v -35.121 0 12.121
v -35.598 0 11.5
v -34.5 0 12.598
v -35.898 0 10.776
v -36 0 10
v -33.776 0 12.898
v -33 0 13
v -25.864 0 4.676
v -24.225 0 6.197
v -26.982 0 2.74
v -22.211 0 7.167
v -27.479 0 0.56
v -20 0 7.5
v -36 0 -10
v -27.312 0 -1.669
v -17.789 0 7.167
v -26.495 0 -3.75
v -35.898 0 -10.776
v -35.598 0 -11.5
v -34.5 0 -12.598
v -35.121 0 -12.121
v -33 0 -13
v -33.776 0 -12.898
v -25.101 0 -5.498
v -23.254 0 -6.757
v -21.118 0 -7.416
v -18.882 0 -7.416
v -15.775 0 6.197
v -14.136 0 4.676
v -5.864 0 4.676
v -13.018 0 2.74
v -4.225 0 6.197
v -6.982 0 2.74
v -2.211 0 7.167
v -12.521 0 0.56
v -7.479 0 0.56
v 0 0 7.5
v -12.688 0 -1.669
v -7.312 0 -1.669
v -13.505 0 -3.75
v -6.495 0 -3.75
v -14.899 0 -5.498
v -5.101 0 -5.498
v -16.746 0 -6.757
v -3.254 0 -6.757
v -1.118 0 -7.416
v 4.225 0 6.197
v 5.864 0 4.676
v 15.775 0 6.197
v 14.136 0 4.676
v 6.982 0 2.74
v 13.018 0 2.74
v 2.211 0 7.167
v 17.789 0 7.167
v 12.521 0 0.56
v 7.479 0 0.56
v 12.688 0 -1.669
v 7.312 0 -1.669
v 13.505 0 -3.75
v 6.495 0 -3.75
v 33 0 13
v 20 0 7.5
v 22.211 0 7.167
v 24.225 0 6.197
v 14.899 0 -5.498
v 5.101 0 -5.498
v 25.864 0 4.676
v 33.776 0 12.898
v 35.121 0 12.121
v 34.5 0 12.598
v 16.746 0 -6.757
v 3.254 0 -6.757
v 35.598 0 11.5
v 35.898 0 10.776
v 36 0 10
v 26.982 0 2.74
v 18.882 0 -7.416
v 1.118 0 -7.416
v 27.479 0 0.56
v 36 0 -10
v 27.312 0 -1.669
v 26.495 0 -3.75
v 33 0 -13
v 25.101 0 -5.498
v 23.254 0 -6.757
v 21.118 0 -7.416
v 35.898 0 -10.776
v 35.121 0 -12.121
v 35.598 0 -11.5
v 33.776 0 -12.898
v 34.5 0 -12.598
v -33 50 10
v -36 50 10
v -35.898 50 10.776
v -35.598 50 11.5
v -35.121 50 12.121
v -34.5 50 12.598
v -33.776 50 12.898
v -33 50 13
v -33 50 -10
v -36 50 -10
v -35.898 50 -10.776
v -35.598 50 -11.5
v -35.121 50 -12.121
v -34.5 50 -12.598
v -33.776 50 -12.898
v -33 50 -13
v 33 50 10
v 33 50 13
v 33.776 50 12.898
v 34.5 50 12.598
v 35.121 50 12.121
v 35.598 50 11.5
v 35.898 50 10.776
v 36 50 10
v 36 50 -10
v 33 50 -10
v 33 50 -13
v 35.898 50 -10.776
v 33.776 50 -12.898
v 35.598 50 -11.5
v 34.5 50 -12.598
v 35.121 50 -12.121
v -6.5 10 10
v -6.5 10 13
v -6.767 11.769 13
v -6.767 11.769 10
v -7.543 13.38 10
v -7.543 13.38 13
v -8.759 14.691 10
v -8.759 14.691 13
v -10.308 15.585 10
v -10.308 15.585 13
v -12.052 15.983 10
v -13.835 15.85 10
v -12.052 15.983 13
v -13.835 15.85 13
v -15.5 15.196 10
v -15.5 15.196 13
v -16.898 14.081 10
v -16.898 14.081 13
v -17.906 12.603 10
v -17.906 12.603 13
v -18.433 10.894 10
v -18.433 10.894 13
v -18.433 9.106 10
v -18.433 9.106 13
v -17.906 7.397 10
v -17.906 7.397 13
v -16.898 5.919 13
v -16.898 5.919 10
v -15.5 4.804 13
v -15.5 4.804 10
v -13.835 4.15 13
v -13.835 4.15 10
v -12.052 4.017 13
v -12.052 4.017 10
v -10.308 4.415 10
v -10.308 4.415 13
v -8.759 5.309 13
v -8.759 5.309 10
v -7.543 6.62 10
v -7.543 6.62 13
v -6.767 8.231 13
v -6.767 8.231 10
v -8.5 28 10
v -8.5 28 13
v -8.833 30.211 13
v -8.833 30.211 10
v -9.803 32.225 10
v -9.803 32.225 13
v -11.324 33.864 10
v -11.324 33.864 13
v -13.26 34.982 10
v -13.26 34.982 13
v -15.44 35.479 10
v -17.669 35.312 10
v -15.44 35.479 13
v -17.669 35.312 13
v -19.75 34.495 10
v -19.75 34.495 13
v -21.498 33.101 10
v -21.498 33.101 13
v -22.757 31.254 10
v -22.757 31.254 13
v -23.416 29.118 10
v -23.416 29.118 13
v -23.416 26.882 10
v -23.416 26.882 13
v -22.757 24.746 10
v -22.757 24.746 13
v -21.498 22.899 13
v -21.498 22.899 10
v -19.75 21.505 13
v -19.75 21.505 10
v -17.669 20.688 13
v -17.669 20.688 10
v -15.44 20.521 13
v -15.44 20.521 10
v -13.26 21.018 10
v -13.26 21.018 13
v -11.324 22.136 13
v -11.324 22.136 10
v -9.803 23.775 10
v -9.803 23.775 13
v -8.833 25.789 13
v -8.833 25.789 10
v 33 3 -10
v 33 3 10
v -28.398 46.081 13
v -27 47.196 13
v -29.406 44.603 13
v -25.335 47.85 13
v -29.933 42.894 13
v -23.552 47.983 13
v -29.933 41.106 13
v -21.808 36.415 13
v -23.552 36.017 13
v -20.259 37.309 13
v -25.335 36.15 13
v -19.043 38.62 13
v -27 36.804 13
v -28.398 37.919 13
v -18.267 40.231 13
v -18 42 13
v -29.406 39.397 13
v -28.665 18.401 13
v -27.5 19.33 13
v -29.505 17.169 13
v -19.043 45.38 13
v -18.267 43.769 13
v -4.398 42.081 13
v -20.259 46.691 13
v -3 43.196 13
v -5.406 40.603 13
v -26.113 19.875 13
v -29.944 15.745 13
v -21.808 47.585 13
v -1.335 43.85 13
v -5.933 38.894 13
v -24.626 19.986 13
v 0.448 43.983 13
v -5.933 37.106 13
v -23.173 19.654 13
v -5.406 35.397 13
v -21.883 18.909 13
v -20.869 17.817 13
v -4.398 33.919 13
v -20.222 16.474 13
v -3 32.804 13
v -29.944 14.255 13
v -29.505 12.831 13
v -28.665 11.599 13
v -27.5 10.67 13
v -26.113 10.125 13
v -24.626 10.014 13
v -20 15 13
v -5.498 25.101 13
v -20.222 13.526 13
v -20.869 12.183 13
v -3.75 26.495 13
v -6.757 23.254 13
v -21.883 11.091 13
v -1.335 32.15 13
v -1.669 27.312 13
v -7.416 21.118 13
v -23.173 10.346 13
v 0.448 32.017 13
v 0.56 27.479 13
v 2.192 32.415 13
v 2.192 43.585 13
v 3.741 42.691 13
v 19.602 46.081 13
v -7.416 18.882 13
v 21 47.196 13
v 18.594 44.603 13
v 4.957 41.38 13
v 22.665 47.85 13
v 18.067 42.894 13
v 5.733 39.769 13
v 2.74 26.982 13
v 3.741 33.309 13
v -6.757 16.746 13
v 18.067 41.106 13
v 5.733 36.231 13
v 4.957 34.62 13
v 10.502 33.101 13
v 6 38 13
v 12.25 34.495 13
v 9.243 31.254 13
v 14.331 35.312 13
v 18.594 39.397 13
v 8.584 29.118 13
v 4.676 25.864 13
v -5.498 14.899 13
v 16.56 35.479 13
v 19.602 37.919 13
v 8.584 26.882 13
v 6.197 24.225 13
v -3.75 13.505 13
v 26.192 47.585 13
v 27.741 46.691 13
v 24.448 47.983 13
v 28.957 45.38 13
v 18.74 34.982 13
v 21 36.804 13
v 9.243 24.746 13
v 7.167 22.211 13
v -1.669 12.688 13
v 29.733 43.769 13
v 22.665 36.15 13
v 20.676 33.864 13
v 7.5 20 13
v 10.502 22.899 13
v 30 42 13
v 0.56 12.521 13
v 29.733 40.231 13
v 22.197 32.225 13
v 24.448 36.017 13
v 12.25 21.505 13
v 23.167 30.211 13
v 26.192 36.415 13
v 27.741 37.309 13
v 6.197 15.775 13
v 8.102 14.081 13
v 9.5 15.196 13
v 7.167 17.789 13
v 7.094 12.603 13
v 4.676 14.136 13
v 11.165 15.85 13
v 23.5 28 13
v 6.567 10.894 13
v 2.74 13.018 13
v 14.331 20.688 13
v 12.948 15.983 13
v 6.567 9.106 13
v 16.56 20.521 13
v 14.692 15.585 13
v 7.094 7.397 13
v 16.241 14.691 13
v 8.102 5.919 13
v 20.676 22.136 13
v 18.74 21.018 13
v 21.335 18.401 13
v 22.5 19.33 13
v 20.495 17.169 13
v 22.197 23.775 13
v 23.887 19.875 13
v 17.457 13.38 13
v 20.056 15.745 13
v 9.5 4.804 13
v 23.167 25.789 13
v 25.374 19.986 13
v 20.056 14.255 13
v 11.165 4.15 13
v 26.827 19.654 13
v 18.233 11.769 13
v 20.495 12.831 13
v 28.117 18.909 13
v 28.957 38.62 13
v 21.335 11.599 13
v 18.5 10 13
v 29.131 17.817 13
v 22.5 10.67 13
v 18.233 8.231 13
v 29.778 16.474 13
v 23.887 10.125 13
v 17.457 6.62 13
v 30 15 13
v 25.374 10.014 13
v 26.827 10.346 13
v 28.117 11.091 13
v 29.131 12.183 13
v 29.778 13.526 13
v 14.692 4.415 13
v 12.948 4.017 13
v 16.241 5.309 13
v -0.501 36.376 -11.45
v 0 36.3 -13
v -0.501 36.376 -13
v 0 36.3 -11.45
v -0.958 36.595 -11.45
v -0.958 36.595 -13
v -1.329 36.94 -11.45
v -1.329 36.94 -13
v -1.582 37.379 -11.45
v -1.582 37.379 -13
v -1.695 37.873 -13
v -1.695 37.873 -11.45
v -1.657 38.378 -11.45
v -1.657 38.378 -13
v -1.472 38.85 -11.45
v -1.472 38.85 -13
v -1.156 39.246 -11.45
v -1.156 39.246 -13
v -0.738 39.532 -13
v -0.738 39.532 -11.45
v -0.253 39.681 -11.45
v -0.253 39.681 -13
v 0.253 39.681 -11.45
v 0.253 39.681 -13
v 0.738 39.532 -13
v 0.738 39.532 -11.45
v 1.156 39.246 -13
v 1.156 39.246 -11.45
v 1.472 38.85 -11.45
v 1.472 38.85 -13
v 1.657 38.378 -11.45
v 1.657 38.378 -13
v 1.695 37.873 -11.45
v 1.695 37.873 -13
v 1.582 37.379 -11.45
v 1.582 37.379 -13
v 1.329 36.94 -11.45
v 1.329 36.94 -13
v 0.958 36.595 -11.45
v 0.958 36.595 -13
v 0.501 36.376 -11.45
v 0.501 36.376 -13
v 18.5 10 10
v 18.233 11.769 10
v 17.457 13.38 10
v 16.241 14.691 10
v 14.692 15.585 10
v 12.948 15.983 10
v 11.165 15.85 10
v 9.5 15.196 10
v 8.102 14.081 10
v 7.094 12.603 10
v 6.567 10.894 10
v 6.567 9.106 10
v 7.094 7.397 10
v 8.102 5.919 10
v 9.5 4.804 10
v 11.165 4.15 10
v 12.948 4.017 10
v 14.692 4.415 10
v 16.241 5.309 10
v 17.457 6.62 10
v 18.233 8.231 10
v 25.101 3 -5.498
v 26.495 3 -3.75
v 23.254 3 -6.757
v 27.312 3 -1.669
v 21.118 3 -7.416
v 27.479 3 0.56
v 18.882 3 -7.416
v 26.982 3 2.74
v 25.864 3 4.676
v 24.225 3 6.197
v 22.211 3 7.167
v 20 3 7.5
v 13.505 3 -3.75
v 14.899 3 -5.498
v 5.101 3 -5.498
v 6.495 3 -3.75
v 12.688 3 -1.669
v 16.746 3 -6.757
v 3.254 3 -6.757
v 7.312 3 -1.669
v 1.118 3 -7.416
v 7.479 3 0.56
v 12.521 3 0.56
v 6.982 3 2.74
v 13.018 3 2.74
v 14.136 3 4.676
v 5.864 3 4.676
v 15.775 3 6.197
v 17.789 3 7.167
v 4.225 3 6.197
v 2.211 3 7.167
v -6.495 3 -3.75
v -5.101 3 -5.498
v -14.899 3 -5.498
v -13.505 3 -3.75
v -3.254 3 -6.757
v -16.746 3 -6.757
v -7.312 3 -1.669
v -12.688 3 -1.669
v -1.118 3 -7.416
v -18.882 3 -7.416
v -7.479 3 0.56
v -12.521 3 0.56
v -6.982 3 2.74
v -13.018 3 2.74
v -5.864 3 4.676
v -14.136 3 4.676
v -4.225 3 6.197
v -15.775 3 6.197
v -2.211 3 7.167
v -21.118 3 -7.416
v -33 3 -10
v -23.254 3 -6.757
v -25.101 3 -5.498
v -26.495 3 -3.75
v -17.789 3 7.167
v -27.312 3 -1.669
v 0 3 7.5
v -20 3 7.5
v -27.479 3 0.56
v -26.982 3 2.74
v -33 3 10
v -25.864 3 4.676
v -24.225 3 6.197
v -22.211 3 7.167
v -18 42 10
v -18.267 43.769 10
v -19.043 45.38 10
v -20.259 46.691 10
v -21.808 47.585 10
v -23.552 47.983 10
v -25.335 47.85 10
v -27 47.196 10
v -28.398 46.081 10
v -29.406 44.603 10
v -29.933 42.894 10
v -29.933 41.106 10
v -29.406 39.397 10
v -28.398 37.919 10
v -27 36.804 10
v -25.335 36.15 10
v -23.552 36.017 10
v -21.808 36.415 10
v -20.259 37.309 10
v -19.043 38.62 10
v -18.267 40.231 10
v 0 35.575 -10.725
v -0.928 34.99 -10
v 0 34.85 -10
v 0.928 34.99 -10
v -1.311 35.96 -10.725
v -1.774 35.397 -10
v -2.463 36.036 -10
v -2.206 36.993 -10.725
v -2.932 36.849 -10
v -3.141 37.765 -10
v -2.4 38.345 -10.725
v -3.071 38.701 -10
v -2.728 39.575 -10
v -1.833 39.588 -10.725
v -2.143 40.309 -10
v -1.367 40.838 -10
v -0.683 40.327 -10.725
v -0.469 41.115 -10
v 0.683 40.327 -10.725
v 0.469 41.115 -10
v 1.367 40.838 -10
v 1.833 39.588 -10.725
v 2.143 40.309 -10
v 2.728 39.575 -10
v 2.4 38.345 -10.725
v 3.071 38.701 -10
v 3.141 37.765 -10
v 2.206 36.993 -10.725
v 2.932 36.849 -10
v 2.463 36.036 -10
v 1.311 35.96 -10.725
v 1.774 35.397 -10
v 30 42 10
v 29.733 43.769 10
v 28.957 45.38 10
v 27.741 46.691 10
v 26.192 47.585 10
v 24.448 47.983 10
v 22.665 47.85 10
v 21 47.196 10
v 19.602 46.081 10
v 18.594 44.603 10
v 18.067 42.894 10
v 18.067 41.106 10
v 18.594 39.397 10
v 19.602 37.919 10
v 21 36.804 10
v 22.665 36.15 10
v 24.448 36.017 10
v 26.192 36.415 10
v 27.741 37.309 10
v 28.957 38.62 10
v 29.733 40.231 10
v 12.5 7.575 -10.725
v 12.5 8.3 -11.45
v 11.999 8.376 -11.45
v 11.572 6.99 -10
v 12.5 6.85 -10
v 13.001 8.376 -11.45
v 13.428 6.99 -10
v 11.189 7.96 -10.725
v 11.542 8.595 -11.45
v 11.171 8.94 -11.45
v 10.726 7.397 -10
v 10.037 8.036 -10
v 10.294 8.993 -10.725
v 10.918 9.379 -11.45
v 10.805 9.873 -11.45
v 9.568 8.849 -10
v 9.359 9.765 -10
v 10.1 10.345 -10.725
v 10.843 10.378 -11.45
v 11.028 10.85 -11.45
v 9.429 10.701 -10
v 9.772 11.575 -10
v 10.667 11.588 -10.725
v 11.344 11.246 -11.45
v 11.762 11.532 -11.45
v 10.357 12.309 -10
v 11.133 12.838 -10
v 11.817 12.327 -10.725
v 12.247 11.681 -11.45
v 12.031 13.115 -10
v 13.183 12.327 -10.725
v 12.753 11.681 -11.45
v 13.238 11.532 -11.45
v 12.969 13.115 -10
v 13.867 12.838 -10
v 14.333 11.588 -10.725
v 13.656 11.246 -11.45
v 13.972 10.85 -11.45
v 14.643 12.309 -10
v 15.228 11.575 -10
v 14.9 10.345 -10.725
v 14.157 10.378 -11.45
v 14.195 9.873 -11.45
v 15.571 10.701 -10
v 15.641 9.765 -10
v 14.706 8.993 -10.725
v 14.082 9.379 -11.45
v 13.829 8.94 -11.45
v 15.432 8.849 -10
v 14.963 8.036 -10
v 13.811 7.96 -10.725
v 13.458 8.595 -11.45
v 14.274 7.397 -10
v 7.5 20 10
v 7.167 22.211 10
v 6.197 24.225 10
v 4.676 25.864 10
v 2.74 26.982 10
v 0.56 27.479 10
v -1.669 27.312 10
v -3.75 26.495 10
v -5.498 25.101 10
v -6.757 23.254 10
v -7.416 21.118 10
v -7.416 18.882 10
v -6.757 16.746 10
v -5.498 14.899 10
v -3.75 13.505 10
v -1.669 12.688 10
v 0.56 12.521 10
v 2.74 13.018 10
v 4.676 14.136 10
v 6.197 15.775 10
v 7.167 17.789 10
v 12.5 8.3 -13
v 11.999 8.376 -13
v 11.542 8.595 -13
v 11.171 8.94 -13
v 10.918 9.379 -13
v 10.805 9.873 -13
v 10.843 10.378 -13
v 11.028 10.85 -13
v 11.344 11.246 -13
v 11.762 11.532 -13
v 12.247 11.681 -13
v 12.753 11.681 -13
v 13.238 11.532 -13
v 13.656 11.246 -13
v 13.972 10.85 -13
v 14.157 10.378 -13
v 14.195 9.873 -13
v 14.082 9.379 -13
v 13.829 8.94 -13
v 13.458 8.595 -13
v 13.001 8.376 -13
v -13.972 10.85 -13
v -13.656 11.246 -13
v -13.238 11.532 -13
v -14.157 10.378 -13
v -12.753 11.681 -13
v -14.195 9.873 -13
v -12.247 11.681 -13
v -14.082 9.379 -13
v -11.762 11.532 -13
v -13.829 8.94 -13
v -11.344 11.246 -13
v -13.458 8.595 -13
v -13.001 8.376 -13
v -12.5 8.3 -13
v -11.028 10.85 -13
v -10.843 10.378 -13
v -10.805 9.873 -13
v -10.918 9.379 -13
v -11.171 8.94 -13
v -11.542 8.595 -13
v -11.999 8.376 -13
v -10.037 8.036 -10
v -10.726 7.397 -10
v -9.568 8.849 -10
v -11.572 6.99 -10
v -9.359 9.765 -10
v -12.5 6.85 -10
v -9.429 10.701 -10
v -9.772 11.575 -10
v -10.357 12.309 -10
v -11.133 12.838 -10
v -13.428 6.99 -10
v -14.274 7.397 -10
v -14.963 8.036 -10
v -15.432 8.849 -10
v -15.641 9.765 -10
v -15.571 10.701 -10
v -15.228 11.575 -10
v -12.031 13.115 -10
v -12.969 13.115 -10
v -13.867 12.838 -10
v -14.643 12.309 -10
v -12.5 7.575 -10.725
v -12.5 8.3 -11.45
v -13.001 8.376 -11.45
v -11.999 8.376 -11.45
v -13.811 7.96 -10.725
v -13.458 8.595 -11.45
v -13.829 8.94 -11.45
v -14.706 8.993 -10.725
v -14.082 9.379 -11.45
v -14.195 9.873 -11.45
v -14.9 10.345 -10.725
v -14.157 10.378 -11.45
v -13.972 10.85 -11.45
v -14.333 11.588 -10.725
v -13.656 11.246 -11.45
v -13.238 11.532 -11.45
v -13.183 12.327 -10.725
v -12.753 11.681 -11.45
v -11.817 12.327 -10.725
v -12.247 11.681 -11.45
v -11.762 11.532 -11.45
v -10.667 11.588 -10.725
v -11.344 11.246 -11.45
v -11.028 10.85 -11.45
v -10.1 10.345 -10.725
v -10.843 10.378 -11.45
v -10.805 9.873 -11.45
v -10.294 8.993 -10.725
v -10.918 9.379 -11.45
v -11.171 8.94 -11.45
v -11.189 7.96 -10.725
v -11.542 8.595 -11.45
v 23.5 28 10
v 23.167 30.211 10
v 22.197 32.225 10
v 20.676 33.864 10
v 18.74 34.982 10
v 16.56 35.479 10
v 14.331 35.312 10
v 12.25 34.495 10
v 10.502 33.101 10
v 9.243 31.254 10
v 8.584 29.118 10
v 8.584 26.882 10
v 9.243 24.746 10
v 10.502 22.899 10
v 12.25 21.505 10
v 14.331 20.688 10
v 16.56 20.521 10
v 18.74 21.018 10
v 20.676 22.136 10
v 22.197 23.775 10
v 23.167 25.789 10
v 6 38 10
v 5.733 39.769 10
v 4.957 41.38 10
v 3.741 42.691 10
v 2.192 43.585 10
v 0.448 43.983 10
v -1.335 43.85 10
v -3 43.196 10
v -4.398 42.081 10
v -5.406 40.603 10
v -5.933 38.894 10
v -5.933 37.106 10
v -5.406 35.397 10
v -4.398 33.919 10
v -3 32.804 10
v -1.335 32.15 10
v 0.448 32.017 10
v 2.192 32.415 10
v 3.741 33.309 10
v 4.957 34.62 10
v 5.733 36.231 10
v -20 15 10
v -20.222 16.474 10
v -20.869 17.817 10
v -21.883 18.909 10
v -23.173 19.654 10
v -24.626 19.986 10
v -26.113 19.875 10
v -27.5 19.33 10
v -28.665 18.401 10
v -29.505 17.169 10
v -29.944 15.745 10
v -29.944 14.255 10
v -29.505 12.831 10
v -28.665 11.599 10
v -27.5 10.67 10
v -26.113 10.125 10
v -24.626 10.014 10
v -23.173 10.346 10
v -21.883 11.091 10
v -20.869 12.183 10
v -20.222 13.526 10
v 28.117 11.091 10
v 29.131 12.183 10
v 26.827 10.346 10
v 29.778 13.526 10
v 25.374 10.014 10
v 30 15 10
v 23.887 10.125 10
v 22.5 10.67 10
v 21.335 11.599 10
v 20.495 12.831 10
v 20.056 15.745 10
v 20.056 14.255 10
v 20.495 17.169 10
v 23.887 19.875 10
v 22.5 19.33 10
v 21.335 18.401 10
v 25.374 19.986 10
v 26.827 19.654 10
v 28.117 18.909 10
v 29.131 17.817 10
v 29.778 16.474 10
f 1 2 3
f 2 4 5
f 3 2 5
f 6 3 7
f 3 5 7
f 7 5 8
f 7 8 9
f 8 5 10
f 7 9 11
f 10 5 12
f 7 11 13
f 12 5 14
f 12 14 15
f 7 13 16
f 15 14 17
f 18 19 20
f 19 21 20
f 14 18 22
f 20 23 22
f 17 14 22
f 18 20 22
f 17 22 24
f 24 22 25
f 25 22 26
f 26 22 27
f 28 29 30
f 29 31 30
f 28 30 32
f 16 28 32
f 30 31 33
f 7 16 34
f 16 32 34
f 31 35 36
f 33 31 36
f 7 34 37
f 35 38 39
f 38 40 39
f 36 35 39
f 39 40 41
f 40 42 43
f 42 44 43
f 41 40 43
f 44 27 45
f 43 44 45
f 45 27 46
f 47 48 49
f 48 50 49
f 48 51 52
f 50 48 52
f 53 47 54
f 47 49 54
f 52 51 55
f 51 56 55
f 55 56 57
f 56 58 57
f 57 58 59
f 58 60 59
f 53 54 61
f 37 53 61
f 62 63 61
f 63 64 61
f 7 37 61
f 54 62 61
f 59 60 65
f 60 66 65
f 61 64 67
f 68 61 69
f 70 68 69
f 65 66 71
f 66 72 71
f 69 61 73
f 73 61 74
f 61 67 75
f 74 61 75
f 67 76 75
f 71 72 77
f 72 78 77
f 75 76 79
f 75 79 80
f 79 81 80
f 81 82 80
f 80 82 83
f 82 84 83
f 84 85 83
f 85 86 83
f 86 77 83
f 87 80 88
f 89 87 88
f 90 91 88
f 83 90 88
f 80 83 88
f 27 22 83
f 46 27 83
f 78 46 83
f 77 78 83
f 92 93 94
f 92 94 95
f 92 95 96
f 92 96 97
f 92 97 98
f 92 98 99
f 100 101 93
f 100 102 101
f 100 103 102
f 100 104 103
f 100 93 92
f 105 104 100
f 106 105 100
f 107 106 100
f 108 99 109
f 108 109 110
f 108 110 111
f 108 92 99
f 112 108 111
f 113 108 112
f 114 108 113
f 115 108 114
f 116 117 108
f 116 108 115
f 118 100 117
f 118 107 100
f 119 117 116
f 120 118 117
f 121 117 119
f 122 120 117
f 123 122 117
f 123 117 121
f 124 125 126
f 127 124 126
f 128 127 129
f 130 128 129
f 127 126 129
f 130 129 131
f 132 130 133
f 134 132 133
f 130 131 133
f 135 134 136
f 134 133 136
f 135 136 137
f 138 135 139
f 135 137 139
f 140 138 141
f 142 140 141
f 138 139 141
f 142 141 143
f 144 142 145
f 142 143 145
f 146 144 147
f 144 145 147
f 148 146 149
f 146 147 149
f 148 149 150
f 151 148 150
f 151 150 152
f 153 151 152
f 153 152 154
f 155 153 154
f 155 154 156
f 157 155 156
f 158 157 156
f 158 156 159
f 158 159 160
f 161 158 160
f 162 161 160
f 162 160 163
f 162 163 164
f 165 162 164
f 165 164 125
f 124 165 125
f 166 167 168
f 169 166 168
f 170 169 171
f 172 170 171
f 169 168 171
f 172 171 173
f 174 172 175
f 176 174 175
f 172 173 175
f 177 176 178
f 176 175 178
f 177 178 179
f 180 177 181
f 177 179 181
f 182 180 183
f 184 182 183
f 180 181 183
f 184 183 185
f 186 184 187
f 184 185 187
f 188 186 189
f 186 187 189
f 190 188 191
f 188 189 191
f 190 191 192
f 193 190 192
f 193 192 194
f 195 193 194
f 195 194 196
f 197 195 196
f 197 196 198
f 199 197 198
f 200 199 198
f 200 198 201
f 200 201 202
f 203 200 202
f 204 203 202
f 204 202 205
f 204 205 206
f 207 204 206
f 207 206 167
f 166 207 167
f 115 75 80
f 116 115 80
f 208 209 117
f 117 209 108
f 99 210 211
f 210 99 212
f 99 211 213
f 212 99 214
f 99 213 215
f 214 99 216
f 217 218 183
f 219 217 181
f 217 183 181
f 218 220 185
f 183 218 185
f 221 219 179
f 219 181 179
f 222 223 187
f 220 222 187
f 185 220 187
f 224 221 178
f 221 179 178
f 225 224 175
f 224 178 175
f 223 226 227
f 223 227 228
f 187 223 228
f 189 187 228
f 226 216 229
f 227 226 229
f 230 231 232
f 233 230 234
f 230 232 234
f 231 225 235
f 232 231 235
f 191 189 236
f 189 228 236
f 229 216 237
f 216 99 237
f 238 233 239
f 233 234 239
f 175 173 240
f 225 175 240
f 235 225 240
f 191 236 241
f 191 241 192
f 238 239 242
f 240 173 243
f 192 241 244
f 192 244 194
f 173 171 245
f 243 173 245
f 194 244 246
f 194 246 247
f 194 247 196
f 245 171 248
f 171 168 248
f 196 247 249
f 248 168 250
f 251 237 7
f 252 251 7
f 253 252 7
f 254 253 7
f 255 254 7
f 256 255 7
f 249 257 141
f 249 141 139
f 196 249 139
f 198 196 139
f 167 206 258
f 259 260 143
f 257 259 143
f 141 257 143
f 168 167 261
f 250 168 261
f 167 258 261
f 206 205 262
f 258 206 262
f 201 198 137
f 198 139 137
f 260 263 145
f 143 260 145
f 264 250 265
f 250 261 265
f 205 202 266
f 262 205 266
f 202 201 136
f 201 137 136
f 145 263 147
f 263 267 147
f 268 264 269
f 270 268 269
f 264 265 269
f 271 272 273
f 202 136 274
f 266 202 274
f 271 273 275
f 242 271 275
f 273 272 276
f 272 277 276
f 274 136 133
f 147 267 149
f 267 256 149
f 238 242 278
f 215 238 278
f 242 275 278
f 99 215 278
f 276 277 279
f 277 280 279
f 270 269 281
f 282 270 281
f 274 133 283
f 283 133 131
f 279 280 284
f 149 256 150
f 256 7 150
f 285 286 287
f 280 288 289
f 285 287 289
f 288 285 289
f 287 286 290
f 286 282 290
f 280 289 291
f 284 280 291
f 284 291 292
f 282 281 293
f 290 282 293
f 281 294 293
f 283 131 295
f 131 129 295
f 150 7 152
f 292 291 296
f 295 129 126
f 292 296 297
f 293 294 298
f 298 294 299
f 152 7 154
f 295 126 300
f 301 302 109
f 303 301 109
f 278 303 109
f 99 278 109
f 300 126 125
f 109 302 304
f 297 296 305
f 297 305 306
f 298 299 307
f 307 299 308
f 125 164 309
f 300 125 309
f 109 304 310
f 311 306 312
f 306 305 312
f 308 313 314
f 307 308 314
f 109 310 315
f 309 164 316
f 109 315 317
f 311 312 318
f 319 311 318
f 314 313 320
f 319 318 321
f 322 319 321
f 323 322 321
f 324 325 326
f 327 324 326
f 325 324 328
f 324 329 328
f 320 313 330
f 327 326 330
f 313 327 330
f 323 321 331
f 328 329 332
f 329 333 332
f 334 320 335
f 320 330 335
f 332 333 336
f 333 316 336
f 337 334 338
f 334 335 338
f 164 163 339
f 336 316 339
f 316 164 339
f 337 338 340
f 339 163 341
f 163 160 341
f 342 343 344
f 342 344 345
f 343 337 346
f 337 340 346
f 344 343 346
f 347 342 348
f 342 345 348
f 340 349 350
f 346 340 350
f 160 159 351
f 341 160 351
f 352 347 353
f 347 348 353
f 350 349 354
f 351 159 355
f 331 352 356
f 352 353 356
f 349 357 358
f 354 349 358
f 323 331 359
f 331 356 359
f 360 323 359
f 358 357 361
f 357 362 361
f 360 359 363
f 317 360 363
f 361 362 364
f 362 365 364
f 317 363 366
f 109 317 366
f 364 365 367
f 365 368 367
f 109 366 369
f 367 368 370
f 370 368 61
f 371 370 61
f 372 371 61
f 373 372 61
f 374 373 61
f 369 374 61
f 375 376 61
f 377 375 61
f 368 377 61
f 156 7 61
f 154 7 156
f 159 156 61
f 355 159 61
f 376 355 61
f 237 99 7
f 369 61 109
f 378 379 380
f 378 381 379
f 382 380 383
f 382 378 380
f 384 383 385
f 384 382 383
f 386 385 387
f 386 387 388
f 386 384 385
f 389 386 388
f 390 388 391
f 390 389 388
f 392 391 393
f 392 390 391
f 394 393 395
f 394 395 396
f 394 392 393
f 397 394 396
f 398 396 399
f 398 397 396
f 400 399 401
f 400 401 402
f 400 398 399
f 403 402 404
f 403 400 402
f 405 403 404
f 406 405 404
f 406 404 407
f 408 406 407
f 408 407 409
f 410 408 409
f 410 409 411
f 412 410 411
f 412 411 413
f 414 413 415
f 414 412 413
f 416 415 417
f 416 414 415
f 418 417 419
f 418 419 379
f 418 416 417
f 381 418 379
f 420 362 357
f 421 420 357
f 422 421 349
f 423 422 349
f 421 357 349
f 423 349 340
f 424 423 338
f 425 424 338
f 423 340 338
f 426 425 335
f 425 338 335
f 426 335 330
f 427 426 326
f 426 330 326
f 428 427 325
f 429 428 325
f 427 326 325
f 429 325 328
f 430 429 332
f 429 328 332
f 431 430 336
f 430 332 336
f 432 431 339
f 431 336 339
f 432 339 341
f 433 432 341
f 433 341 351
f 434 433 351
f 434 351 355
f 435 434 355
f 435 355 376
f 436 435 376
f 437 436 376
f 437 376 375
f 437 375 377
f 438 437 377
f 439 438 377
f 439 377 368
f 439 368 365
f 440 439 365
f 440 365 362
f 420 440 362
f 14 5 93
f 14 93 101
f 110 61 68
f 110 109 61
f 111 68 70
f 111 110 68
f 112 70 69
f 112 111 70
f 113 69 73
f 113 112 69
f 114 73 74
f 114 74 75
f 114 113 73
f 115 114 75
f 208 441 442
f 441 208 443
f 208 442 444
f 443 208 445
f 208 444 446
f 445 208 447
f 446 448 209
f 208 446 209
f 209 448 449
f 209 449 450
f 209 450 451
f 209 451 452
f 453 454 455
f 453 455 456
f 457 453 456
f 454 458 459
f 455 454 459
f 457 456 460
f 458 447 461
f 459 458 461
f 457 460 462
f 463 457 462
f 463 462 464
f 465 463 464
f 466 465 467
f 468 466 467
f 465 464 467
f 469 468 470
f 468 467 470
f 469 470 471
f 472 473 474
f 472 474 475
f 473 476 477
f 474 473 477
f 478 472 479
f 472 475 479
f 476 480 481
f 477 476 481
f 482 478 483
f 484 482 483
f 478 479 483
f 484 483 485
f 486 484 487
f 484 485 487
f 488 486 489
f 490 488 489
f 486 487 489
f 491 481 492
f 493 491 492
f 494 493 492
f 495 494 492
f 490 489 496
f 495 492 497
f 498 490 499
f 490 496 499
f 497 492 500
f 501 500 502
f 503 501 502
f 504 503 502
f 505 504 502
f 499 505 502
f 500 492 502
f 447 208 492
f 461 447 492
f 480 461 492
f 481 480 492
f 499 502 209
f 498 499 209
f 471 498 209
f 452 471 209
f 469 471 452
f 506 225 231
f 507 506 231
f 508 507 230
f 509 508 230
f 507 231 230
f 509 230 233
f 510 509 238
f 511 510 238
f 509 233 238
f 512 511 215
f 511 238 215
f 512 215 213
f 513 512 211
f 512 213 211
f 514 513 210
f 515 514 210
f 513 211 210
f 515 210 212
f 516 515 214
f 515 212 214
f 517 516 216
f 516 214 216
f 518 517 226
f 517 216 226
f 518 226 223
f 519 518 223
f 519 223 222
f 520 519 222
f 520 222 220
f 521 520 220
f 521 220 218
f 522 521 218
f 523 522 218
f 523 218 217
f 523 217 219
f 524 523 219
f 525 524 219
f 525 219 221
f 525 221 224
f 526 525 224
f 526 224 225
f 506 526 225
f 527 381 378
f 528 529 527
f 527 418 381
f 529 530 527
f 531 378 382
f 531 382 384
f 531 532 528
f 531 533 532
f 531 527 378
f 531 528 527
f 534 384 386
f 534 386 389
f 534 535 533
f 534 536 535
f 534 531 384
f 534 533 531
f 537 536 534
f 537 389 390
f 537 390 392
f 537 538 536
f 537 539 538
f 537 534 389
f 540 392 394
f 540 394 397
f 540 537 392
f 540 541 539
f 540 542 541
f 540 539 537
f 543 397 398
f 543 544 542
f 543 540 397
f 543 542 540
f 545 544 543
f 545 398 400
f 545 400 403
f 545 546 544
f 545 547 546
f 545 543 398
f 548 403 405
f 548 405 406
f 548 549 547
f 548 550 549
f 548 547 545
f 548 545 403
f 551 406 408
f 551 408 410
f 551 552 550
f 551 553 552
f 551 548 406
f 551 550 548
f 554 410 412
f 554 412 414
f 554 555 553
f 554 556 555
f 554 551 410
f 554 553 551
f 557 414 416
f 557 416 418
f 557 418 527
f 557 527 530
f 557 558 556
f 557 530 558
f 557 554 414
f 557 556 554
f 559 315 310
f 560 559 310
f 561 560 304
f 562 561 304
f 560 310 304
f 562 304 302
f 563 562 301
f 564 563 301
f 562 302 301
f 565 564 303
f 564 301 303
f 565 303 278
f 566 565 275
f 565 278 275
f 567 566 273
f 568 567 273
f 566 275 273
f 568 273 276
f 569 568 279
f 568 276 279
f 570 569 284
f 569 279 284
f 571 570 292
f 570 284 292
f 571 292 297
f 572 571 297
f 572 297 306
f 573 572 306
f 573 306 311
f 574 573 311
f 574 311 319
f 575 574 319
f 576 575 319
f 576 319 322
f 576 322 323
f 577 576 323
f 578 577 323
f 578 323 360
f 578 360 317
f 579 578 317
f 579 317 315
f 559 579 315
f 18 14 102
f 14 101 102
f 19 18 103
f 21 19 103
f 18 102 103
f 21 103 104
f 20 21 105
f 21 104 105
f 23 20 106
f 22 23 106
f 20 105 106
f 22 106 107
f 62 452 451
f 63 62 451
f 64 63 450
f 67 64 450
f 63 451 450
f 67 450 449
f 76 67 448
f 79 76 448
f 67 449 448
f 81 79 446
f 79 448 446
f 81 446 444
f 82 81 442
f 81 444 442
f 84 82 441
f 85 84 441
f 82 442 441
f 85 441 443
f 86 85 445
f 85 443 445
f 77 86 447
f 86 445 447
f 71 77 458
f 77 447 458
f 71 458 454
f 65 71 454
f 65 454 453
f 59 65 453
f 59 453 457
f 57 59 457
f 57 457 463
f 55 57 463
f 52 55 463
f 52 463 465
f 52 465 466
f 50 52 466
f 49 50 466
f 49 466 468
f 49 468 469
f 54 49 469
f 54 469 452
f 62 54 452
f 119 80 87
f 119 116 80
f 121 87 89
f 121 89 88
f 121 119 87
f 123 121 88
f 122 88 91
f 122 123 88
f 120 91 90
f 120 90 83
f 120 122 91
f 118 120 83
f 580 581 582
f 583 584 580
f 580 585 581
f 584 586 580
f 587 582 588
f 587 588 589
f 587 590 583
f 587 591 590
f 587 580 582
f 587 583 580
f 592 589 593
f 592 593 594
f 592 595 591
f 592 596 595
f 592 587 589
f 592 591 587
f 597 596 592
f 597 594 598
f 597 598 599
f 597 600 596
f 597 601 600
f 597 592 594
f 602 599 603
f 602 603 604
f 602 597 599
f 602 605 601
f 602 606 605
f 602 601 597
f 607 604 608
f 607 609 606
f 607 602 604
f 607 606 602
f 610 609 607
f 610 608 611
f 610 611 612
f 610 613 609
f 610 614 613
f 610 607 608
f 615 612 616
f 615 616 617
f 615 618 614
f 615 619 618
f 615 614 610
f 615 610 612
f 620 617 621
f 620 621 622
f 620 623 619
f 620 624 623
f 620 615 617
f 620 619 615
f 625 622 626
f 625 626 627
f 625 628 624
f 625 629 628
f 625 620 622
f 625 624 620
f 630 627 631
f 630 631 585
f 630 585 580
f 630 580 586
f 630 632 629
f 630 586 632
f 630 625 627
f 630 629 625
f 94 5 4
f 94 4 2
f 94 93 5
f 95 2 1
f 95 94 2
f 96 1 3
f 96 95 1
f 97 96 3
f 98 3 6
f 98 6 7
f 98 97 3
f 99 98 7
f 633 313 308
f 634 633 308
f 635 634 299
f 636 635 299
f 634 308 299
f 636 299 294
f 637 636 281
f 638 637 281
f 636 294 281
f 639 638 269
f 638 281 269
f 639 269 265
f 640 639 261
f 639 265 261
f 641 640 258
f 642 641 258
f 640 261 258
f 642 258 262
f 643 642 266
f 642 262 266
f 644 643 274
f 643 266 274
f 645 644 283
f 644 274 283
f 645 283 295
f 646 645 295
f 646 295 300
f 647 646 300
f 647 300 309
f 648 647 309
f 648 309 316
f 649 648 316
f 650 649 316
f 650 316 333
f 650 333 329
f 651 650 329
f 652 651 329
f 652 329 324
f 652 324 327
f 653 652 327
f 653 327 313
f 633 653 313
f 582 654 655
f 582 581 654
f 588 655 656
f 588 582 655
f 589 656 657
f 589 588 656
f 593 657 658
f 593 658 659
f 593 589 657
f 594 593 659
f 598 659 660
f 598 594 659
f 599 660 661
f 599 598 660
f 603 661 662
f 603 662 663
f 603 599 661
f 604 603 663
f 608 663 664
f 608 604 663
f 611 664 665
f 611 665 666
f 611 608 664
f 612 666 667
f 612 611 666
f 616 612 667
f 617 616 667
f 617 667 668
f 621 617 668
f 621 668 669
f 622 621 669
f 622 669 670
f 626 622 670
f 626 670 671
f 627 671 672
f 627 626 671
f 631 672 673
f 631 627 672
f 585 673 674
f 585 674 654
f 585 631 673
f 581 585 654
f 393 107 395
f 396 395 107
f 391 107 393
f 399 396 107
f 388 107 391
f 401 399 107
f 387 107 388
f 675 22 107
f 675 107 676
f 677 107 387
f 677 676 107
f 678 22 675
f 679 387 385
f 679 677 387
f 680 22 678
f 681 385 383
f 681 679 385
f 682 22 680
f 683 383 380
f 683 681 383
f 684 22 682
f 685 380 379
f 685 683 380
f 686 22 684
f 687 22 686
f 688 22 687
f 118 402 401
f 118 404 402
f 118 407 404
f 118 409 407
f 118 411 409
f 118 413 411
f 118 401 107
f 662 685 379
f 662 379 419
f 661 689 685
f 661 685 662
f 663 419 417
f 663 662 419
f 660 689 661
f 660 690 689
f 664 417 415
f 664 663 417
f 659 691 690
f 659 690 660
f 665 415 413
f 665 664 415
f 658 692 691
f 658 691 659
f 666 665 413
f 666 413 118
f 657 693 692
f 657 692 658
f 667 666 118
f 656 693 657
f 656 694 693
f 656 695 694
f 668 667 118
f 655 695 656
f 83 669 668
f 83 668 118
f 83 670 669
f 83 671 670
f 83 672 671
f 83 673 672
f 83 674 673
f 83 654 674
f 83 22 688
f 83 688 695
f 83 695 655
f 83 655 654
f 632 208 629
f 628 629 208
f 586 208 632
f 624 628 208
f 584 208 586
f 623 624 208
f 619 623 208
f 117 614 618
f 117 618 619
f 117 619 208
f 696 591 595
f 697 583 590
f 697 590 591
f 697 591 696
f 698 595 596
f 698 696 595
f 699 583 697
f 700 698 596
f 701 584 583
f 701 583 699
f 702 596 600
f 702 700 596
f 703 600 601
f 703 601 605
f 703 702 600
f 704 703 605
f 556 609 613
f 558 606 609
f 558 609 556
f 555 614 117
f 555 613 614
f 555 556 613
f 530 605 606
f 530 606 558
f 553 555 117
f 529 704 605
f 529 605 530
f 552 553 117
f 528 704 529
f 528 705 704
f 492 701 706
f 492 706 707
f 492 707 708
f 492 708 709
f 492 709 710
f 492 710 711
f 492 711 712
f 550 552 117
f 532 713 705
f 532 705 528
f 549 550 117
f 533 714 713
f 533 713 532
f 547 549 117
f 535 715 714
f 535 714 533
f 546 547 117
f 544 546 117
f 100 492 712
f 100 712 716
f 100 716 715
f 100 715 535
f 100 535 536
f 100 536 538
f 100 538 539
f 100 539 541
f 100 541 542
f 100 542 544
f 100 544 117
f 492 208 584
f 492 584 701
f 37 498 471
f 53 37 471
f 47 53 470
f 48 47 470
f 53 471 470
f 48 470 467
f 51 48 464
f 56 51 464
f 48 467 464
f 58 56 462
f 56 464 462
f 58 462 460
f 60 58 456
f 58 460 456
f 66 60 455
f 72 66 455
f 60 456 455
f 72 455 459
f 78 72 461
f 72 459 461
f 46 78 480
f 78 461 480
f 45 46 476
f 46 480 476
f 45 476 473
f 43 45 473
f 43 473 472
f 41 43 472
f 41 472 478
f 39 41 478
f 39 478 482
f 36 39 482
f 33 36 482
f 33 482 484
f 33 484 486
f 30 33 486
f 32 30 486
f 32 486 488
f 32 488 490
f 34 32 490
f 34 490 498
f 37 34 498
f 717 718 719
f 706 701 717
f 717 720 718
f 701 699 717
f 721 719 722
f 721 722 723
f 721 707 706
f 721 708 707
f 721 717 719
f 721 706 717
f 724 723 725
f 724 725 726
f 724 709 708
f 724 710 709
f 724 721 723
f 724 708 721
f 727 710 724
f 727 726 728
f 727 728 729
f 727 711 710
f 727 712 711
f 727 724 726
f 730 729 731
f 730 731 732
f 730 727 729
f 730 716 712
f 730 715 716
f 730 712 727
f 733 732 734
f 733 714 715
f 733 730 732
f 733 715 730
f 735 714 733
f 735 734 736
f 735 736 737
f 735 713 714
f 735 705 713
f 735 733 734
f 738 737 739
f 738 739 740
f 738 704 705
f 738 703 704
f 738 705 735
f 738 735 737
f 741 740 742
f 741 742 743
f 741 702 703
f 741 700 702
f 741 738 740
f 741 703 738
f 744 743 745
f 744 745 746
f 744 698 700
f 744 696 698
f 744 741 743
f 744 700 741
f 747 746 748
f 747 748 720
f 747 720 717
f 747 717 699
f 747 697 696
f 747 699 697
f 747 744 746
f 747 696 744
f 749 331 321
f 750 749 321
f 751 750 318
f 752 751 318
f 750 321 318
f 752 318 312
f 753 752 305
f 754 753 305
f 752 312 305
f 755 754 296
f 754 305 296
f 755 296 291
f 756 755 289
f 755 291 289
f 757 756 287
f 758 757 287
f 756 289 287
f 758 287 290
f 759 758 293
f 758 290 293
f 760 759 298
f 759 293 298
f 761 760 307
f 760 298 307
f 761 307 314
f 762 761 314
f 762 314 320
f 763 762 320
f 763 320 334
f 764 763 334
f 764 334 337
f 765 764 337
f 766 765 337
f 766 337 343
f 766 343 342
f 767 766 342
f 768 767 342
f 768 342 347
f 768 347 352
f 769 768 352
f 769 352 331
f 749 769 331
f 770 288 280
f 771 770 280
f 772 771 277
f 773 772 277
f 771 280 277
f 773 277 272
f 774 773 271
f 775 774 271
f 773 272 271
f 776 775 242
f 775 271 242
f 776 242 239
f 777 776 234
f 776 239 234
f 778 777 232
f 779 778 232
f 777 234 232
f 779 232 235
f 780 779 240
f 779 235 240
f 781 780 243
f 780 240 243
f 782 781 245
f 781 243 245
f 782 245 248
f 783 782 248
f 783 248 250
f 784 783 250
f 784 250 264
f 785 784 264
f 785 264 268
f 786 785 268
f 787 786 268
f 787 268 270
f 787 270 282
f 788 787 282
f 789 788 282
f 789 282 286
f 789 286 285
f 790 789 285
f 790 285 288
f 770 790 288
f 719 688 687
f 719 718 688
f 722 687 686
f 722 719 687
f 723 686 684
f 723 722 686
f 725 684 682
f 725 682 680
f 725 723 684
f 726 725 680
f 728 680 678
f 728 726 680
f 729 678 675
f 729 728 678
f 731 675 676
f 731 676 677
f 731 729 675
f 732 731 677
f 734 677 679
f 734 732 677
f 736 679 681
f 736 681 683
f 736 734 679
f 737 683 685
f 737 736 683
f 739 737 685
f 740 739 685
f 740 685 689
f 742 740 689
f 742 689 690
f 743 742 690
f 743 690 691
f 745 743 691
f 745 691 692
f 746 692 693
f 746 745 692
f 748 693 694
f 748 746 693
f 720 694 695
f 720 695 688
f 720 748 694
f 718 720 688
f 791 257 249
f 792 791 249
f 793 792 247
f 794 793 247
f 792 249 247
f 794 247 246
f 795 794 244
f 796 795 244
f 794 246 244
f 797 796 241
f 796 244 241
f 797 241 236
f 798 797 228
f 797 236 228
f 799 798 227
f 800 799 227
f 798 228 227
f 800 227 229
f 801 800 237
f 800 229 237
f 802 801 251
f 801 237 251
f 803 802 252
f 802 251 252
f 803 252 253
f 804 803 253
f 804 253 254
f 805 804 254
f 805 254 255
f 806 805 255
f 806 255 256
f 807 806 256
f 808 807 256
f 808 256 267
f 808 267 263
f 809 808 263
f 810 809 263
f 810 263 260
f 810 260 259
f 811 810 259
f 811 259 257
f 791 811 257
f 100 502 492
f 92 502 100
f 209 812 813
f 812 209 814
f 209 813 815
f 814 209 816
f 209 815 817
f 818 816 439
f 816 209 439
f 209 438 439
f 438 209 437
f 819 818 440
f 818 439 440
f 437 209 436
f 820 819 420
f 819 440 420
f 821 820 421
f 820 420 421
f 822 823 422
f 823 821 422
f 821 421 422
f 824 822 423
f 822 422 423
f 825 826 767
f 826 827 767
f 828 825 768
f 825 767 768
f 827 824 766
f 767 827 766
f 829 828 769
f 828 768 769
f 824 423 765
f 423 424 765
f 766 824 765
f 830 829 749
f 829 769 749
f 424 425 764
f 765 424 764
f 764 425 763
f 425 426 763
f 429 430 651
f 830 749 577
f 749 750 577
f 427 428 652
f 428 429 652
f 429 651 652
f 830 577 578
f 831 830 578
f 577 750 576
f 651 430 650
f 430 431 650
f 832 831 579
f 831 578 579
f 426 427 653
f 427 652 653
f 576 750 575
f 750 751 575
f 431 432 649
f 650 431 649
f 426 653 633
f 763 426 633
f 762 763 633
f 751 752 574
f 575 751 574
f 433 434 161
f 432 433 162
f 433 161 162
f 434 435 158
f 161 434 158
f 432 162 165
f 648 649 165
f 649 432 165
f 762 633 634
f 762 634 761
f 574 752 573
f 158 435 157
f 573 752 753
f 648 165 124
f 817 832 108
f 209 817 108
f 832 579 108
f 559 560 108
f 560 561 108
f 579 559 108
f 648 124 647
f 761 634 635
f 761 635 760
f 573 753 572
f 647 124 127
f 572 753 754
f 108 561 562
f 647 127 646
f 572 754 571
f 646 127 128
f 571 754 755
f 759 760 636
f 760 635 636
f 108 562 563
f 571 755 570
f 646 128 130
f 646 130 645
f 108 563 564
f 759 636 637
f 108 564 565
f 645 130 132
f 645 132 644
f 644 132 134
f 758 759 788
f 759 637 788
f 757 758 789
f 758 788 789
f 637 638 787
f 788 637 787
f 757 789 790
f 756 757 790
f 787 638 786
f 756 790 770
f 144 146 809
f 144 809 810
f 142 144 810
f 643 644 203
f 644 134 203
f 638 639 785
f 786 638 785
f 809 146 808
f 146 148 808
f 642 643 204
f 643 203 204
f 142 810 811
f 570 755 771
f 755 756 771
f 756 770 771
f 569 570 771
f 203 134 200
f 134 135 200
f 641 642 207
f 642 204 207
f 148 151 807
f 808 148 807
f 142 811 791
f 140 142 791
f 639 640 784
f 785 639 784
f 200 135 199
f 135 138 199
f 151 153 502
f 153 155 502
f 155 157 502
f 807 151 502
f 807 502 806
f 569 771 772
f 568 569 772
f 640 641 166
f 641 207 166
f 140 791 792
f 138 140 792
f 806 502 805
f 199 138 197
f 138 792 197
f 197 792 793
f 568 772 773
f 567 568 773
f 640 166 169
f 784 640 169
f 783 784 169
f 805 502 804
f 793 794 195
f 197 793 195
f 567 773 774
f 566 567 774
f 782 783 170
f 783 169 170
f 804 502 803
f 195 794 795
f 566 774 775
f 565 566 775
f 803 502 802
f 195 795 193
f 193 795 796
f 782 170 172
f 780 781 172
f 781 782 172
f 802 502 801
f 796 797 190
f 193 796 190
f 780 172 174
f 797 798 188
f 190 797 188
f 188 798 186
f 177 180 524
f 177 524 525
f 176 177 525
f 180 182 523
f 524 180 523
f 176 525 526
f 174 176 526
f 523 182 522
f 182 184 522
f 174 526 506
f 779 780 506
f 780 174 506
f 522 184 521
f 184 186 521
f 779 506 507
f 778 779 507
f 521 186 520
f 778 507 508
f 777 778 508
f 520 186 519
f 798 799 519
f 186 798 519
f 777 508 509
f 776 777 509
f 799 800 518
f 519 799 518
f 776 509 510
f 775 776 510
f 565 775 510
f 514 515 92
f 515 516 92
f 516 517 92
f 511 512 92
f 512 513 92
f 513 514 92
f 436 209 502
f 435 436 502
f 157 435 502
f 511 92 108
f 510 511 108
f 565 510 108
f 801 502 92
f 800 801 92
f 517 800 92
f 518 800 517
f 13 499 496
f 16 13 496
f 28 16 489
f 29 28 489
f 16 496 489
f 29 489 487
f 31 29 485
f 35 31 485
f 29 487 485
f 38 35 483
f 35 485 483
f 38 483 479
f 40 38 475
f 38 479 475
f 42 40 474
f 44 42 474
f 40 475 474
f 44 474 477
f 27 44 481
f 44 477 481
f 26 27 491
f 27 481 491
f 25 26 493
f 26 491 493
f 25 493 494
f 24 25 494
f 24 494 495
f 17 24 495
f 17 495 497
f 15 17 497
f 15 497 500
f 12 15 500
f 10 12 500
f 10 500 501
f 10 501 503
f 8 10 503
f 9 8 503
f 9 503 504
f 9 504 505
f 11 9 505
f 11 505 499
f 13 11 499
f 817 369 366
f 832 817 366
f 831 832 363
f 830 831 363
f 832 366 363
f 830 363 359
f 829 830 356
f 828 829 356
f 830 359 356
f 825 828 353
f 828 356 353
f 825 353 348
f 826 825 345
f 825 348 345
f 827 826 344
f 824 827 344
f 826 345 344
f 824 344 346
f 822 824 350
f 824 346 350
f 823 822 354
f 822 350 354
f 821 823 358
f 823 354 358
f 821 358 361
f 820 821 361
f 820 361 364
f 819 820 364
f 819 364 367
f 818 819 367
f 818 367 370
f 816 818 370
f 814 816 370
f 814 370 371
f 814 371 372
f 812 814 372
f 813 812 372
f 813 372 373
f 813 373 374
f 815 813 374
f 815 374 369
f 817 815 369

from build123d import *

# Parameters (mm, degrees)
SKETCH1_W                                    = 72
SKETCH1_H                                    = 26
BOSS_EXTRUDE1_DEPTH                          = 50
FILLET1_R                                    = 3
SHELL1_START                                 = -33
SHELL1_OUTLINE_W                             = 47
SHELL1_OUTLINE_H                             = 20
SHELL1_DEPTH                                 = 66
SKETCH2_R                                    = 7.5
CUT_EXTRUDE1_DEPTH                           = 61.613529843
CSK_FOR_M3_COUNTERSUNK_FLAT_HEAD_SCR_2_COUNT = 2
CSK_FOR_M3_COUNTERSUNK_FLAT_HEAD_SCR_2_PITCH = 30.663496213
CSK_FOR_M3_COUNTERSUNK_FLAT_HEAD_SCR_3_COUNT = 2
CSK_FOR_M3_COUNTERSUNK_FLAT_HEAD_SCR_3_PITCH = 30.663496213
CUT_EXTRUDE2_REACH                           = 68.873
SKETCH6_R                                    = 6
SKETCH6_R_2                                  = 7.5
SKETCH6_R_3                                  = 5


# Read off the part's stored shape, not the designer's step: Shell1
with BuildPart() as part:
    # Sketch1 → Boss-Extrude1 (new body)
    with BuildSketch(Plane(origin=(0, 0, 0), x_dir=(1, 0, 0), z_dir=(0, 1, 0))):
        Rectangle(SKETCH1_W, SKETCH1_H)
    extrude(amount=BOSS_EXTRUDE1_DEPTH)

    # Fillet1
    fillet1_edges = [part.edges().sort_by_distance(p)[0] for p in [
        (-36, 25, -13),
        (36, 25, -13),
        (36, 25, 13),
        (-36, 25, 13),
    ]]
    fillet(fillet1_edges, radius=FILLET1_R)

    # Shell1 outline → Shell1 (cut)
    with BuildSketch(Plane.YZ.offset(SHELL1_START)):
        with Locations((26.5, 0)):
            Rectangle(SHELL1_OUTLINE_W, SHELL1_OUTLINE_H)
    extrude(amount=SHELL1_DEPTH, mode=Mode.SUBTRACT)

    # Sketch2 → Cut-Extrude1 (cut, through all)
    with BuildSketch(Plane(origin=(0, 3, 0), x_dir=(1, 0, 0), z_dir=(0, 1, 0))):
        with Locations(Location((0, 0, 0), (0, 0, 270))):
            Circle(SKETCH2_R)
        with Locations(Location((-20, 0, 0), (0, 0, 270))):
            Circle(SKETCH2_R)
        with Locations(Location((20, 0, 0), (0, 0, 270))):
            Circle(SKETCH2_R)
    extrude(amount=-CUT_EXTRUDE1_DEPTH, mode=Mode.SUBTRACT)

    # Sketch4 → CSK for M3 Countersunk Flat Head Screw1 (revolve, cut)
    with BuildSketch(Plane(origin=(0, 38, -10), x_dir=(0, -1, 0), z_dir=(1, 0, 0))):
        Polygon((0, 0), (0, 3), (1.7, 3), (1.7, 1.45), (3.15, 0), align=None)
    csk_for_m3_countersunk_flat_head_screw1 = revolve(axis=Axis((0, 38, -3.65), (0, 0, -1)), mode=Mode.SUBTRACT)

    # CSK for M3 Countersunk Flat Head Scr 2: CSK for M3 Countersunk Flat Head Screw1 ×2
    with Locations(*[Vector(-0.4076508403738889, -0.9131378824375114, 0) * (i * CSK_FOR_M3_COUNTERSUNK_FLAT_HEAD_SCR_2_PITCH) for i in range(1, CSK_FOR_M3_COUNTERSUNK_FLAT_HEAD_SCR_2_COUNT)]):
        add(csk_for_m3_countersunk_flat_head_screw1, mode=Mode.SUBTRACT)

    # CSK for M3 Countersunk Flat Head Scr 3: CSK for M3 Countersunk Flat Head Screw1 ×2
    with Locations(*[Vector(0.4076508403738889, -0.9131378824375114, 0) * (i * CSK_FOR_M3_COUNTERSUNK_FLAT_HEAD_SCR_3_PITCH) for i in range(1, CSK_FOR_M3_COUNTERSUNK_FLAT_HEAD_SCR_3_COUNT)]):
        add(csk_for_m3_countersunk_flat_head_screw1, mode=Mode.SUBTRACT)

    # Sketch6 → Cut-Extrude2 (cut, up to next)
    with BuildSketch(Plane.XY.offset(13), mode=Mode.PRIVATE) as cut_extrude2_sk1:
        with Locations((0, 38)):
            Circle(SKETCH6_R)
    cut_extrude2_tool1 = extrude(cut_extrude2_sk1.sketch, amount=-CUT_EXTRUDE2_REACH, mode=Mode.PRIVATE) & part.part
    # Sketch6 → Cut-Extrude2 (cut, up to next)
    with BuildSketch(Plane.XY.offset(13), mode=Mode.PRIVATE) as cut_extrude2_sk2:
        with Locations((-12.5, 10)):
            Circle(SKETCH6_R)
    cut_extrude2_tool2 = extrude(cut_extrude2_sk2.sketch, amount=-CUT_EXTRUDE2_REACH, mode=Mode.PRIVATE) & part.part
    # Sketch6 → Cut-Extrude2 (cut, up to next)
    with BuildSketch(Plane.XY.offset(13), mode=Mode.PRIVATE) as cut_extrude2_sk3:
        with Locations((12.5, 10)):
            Circle(SKETCH6_R)
    cut_extrude2_tool3 = extrude(cut_extrude2_sk3.sketch, amount=-CUT_EXTRUDE2_REACH, mode=Mode.PRIVATE) & part.part
    # Sketch6 → Cut-Extrude2 (cut, up to next)
    with BuildSketch(Plane.XY.offset(13), mode=Mode.PRIVATE) as cut_extrude2_sk4:
        with Locations((0, 20)):
            Circle(SKETCH6_R_2)
    cut_extrude2_tool4 = extrude(cut_extrude2_sk4.sketch, amount=-CUT_EXTRUDE2_REACH, mode=Mode.PRIVATE) & part.part
    # Sketch6 → Cut-Extrude2 (cut, up to next)
    with BuildSketch(Plane.XY.offset(13), mode=Mode.PRIVATE) as cut_extrude2_sk5:
        with Locations((24, 42)):
            Circle(SKETCH6_R)
    cut_extrude2_tool5 = extrude(cut_extrude2_sk5.sketch, amount=-CUT_EXTRUDE2_REACH, mode=Mode.PRIVATE) & part.part
    # Sketch6 → Cut-Extrude2 (cut, up to next)
    with BuildSketch(Plane.XY.offset(13), mode=Mode.PRIVATE) as cut_extrude2_sk6:
        with Locations((16, 28)):
            Circle(SKETCH6_R_2)
    cut_extrude2_tool6 = extrude(cut_extrude2_sk6.sketch, amount=-CUT_EXTRUDE2_REACH, mode=Mode.PRIVATE) & part.part
    # Sketch6 → Cut-Extrude2 (cut, up to next)
    with BuildSketch(Plane.XY.offset(13), mode=Mode.PRIVATE) as cut_extrude2_sk7:
        with Locations((-16, 28)):
            Circle(SKETCH6_R_2)
    cut_extrude2_tool7 = extrude(cut_extrude2_sk7.sketch, amount=-CUT_EXTRUDE2_REACH, mode=Mode.PRIVATE) & part.part
    # Sketch6 → Cut-Extrude2 (cut, up to next)
    with BuildSketch(Plane.XY.offset(13), mode=Mode.PRIVATE) as cut_extrude2_sk8:
        with Locations((-24, 42)):
            Circle(SKETCH6_R)
    cut_extrude2_tool8 = extrude(cut_extrude2_sk8.sketch, amount=-CUT_EXTRUDE2_REACH, mode=Mode.PRIVATE) & part.part
    # Sketch6 → Cut-Extrude2 (cut, up to next)
    with BuildSketch(Plane.XY.offset(13), mode=Mode.PRIVATE) as cut_extrude2_sk9:
        with Locations((25, 15)):
            Circle(SKETCH6_R_3)
    cut_extrude2_tool9 = extrude(cut_extrude2_sk9.sketch, amount=-CUT_EXTRUDE2_REACH, mode=Mode.PRIVATE) & part.part
    # Sketch6 → Cut-Extrude2 (cut, up to next)
    with BuildSketch(Plane.XY.offset(13), mode=Mode.PRIVATE) as cut_extrude2_sk10:
        with Locations((-25, 15)):
            Circle(SKETCH6_R_3)
    cut_extrude2_tool10 = extrude(cut_extrude2_sk10.sketch, amount=-CUT_EXTRUDE2_REACH, mode=Mode.PRIVATE) & part.part
    add(cut_extrude2_tool1.solids().sort_by_distance((0, 38, 13))[0], mode=Mode.SUBTRACT)
    add(cut_extrude2_tool2.solids().sort_by_distance((-12.5, 10, 13))[0], mode=Mode.SUBTRACT)
    add(cut_extrude2_tool3.solids().sort_by_distance((12.5, 10, 13))[0], mode=Mode.SUBTRACT)
    add(cut_extrude2_tool4.solids().sort_by_distance((0, 20, 13))[0], mode=Mode.SUBTRACT)
    add(cut_extrude2_tool5.solids().sort_by_distance((24, 42, 13))[0], mode=Mode.SUBTRACT)
    add(cut_extrude2_tool6.solids().sort_by_distance((16, 28, 13))[0], mode=Mode.SUBTRACT)
    add(cut_extrude2_tool7.solids().sort_by_distance((-16, 28, 13))[0], mode=Mode.SUBTRACT)
    add(cut_extrude2_tool8.solids().sort_by_distance((-24, 42, 13))[0], mode=Mode.SUBTRACT)
    add(cut_extrude2_tool9.solids().sort_by_distance((25, 15, 13))[0], mode=Mode.SUBTRACT)
    add(cut_extrude2_tool10.solids().sort_by_distance((-25, 15, 13))[0], mode=Mode.SUBTRACT)


solid = part.part
